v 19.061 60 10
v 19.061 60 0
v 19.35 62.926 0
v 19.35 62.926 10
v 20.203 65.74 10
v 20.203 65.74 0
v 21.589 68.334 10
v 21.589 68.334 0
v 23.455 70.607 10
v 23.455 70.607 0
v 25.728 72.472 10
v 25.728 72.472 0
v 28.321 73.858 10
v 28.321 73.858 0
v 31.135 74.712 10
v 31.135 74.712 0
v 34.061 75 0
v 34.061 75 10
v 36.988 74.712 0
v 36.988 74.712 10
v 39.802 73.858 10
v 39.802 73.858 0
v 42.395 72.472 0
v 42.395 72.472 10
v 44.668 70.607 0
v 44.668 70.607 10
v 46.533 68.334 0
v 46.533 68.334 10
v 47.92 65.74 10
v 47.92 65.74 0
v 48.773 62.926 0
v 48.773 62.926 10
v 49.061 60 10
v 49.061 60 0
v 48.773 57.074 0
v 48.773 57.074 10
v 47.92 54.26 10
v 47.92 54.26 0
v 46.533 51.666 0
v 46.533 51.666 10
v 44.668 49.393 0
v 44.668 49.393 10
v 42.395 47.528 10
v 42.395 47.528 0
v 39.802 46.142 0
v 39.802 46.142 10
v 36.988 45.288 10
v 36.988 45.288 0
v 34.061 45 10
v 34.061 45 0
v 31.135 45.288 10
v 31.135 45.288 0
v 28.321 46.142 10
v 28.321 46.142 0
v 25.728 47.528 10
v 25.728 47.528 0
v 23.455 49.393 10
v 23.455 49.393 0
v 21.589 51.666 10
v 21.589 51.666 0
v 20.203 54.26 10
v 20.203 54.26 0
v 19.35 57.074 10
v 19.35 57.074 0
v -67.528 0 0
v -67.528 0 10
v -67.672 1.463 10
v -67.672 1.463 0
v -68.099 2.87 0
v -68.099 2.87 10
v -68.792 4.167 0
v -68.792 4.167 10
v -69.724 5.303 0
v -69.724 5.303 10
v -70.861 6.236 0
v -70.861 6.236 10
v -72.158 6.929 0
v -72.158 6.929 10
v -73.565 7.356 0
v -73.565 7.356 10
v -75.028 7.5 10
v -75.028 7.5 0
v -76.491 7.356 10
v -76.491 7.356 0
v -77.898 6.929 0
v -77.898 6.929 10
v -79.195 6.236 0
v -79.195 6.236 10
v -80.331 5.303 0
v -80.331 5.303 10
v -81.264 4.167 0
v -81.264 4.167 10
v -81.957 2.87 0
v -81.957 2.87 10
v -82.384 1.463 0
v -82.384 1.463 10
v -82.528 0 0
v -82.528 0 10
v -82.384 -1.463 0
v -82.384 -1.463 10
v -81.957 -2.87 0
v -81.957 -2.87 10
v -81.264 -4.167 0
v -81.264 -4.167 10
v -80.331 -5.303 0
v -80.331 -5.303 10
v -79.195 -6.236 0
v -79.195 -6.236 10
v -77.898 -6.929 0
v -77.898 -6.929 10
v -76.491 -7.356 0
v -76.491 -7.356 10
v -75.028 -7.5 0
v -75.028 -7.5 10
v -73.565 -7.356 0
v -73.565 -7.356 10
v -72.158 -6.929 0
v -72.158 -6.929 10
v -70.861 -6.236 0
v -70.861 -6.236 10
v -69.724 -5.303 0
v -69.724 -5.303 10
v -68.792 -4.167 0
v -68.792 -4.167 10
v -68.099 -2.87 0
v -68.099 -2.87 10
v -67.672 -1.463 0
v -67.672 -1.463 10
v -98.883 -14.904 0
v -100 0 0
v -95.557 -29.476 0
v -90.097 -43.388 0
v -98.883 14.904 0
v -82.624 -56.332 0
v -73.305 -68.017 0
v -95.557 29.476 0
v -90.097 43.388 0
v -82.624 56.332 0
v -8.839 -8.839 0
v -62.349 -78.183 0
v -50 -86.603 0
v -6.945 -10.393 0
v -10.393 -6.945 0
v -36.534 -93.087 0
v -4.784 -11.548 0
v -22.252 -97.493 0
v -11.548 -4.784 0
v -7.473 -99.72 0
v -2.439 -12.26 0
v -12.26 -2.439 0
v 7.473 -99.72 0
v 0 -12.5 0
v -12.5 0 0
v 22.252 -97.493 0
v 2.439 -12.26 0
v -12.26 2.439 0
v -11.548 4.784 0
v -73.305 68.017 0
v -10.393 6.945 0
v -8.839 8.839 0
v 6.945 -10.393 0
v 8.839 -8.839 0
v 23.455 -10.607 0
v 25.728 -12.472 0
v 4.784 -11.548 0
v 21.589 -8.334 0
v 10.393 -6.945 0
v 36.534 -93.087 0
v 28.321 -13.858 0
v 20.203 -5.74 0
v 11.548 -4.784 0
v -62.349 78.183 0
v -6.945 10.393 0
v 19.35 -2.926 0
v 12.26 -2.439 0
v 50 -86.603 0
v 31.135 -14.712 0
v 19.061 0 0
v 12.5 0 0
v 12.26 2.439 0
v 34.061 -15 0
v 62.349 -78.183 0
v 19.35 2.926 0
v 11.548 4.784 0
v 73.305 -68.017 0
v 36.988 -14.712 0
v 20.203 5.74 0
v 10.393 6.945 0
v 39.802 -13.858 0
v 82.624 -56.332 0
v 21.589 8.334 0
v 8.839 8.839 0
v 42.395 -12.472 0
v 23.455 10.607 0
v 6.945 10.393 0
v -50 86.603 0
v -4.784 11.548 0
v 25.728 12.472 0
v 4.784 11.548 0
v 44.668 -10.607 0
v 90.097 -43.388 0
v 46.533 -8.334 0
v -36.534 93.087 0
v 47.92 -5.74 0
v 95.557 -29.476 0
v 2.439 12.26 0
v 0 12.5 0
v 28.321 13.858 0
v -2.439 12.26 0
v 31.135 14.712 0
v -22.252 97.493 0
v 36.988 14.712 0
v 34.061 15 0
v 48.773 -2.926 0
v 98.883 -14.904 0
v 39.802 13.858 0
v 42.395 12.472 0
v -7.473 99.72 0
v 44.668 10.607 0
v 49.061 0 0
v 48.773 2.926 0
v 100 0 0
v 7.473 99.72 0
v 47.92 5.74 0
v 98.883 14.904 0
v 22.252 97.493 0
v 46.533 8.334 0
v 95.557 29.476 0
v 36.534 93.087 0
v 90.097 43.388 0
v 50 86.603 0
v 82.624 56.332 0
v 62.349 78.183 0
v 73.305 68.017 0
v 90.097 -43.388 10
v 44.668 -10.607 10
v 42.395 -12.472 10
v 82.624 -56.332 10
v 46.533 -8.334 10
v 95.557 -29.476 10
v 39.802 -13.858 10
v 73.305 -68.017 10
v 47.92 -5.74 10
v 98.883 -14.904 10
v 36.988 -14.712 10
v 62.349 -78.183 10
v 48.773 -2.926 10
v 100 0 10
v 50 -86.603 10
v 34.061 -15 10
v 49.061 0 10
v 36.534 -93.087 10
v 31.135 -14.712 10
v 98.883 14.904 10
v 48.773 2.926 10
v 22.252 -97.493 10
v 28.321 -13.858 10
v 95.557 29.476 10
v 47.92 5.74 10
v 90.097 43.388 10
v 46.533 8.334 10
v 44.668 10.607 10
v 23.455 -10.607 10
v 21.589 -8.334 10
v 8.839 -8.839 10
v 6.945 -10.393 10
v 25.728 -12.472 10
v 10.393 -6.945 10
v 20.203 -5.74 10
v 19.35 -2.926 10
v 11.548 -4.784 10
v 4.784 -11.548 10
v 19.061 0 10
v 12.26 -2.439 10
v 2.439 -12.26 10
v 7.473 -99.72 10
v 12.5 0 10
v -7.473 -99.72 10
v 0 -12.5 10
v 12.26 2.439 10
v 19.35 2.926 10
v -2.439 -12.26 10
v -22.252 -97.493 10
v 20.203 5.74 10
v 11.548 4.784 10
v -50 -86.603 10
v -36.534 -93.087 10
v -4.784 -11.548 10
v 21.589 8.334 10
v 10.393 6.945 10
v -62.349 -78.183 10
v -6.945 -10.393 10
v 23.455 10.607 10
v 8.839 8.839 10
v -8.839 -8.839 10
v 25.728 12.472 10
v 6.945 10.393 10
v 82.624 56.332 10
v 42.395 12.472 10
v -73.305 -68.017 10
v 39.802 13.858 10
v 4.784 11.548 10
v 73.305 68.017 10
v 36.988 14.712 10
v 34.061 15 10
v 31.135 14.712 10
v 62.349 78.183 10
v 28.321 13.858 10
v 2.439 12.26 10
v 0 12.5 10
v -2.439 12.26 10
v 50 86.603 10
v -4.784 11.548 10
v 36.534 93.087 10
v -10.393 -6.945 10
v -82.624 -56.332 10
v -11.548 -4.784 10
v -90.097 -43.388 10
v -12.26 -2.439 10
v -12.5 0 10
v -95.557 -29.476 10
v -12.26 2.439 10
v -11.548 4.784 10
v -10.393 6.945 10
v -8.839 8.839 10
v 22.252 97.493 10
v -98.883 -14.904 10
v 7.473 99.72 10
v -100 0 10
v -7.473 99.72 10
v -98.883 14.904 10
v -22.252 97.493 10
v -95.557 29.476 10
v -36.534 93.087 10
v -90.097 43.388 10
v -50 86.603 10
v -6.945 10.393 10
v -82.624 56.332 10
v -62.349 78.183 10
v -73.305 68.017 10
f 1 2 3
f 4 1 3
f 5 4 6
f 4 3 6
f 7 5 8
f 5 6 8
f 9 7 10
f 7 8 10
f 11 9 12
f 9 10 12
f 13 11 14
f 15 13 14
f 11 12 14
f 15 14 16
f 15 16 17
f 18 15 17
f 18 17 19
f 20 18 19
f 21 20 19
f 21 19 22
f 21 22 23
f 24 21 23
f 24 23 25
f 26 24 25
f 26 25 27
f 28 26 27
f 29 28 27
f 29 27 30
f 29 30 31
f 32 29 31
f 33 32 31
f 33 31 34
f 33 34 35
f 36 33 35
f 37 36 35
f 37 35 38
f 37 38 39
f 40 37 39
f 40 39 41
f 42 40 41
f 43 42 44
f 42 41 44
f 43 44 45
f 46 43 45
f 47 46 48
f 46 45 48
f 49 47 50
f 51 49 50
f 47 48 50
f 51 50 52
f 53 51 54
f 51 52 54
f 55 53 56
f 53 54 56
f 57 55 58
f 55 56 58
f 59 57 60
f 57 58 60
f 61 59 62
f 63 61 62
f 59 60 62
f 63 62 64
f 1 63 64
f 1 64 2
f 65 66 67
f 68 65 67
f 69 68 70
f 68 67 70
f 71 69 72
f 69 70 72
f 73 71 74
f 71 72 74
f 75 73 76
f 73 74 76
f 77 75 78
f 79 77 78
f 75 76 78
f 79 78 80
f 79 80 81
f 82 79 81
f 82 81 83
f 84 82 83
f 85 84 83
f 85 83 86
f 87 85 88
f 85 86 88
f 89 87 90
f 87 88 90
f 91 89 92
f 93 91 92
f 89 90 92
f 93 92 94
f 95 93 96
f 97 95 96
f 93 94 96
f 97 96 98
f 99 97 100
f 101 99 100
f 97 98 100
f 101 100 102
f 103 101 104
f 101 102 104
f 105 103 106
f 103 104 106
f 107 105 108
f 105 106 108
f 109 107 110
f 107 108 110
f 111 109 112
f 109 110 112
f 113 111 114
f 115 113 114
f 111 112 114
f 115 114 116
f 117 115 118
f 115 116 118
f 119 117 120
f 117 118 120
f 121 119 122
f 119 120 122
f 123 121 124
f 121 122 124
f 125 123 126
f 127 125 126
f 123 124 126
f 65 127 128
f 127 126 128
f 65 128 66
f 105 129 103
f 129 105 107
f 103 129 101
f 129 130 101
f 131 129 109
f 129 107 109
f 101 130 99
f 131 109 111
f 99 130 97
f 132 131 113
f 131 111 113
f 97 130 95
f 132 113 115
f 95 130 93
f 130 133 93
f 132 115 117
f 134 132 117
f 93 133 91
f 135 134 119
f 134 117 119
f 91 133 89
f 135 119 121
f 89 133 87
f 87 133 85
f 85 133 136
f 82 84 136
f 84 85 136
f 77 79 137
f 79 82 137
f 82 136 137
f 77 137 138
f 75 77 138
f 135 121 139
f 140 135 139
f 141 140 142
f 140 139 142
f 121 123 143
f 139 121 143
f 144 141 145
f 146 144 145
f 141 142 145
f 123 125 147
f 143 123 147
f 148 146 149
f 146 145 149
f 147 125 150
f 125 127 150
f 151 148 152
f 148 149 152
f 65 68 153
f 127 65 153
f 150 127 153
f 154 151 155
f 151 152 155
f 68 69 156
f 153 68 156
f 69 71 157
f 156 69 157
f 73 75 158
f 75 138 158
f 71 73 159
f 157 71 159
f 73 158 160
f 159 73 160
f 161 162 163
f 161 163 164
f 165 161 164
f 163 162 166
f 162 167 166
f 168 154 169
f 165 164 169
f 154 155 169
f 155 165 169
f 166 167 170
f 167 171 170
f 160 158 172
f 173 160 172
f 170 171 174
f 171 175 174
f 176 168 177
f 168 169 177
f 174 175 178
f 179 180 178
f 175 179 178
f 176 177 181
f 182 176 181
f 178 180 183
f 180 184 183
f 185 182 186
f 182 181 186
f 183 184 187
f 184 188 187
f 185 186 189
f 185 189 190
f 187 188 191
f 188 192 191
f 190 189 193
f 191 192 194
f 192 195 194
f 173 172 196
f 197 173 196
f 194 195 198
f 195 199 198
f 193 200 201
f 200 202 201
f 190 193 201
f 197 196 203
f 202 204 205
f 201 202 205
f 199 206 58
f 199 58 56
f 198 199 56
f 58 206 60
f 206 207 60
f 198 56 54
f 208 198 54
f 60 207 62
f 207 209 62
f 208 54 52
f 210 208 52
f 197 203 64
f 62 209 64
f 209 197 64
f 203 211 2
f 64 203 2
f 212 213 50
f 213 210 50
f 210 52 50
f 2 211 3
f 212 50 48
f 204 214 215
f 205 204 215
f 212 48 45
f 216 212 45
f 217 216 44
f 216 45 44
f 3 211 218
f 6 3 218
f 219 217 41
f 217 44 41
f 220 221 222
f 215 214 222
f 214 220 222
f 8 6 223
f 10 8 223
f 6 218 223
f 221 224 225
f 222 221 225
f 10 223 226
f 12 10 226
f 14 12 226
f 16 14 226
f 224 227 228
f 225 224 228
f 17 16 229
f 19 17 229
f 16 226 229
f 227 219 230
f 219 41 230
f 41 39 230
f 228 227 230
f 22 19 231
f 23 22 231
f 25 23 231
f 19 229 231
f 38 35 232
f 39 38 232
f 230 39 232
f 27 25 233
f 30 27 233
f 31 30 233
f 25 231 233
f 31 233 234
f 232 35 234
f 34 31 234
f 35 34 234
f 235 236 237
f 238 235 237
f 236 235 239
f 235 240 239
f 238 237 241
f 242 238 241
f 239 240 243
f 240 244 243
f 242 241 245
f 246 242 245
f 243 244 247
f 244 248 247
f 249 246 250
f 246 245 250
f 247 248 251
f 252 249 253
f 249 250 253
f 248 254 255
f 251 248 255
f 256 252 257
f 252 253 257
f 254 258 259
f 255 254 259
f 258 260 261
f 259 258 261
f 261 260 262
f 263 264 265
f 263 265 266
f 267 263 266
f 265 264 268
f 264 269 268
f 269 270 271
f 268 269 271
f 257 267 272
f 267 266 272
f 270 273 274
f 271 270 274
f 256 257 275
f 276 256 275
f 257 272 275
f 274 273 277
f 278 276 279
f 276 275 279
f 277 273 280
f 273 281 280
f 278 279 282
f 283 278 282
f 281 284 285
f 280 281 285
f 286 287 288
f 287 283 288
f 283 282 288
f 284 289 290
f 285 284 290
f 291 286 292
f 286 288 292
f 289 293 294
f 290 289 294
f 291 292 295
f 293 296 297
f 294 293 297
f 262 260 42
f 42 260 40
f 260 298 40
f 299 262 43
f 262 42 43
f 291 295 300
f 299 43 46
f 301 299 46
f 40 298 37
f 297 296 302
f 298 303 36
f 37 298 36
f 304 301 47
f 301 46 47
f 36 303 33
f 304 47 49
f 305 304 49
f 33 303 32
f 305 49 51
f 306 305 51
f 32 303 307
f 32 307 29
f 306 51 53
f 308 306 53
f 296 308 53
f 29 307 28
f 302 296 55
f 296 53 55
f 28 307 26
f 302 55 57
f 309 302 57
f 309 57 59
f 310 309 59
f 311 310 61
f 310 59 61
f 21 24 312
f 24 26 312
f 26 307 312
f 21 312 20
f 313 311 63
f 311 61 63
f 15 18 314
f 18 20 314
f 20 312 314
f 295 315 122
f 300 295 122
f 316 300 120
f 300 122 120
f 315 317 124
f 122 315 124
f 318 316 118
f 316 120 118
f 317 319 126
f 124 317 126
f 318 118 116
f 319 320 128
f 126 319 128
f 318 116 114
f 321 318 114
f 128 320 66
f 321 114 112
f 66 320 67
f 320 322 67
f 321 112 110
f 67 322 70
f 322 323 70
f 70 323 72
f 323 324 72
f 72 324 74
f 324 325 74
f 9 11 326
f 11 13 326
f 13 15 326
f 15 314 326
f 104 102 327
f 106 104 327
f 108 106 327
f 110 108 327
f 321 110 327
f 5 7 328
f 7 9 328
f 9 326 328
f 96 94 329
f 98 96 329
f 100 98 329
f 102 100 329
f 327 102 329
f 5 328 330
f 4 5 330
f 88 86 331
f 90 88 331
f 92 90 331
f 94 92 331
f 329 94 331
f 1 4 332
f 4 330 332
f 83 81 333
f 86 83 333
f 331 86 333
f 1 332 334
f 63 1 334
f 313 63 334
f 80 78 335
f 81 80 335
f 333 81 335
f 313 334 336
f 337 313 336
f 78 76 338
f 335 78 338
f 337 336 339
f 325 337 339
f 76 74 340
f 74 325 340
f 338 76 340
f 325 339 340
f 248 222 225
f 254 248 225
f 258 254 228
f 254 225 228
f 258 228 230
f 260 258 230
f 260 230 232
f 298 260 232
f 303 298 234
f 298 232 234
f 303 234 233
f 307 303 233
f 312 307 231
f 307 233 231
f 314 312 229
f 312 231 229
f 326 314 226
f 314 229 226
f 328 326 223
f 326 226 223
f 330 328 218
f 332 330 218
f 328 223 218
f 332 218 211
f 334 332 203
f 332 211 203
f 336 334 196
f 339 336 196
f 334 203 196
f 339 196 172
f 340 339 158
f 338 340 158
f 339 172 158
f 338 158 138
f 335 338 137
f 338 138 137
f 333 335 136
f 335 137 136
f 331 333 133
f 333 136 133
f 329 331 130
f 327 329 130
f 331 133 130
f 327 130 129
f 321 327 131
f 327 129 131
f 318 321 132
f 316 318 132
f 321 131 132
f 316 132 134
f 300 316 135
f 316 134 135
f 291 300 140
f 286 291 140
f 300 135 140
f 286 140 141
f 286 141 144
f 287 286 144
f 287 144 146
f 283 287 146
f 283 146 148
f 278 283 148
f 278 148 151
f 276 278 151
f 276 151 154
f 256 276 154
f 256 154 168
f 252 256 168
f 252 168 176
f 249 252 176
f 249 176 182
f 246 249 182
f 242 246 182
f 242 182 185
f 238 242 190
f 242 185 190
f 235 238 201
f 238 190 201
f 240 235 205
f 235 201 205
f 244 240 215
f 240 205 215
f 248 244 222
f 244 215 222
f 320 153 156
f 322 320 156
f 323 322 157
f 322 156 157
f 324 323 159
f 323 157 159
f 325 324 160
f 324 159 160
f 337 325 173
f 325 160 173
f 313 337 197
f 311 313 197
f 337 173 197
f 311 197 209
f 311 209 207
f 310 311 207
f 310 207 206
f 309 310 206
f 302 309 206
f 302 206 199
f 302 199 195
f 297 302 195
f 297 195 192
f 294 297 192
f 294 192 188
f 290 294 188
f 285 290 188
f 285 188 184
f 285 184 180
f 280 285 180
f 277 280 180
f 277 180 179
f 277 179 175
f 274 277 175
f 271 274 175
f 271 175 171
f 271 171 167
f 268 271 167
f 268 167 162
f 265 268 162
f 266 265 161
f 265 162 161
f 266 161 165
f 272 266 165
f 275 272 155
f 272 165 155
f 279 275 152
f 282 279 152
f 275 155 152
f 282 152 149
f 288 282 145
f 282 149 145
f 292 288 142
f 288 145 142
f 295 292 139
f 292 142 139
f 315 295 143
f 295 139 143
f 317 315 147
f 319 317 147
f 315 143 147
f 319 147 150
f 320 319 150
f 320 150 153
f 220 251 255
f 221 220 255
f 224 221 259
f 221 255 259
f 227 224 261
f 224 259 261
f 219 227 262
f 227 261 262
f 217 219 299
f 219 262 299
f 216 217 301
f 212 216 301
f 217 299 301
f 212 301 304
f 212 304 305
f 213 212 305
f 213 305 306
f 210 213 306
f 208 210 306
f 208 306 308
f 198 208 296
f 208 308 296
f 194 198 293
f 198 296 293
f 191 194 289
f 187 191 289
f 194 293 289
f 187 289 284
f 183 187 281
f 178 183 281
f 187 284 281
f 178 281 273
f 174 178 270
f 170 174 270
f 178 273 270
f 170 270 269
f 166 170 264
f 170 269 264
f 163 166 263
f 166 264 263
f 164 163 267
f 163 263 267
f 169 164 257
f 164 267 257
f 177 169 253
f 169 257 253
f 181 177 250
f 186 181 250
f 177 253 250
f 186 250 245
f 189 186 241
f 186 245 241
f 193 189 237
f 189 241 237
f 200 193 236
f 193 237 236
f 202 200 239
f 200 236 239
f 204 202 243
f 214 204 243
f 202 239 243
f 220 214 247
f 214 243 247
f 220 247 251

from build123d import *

# Parameters (mm, degrees)
SKETCH1_R           = 100
BOSS_EXTRUDE1_DEPTH = 10
SKETCH3_R           = 12.5
CUT_EXTRUDE2_DEPTH  = 20
SKETCH2_R           = 7.5
CUT_EXTRUDE3_DEPTH  = 10
SKETCH5_R           = 15
CUT_EXTRUDE5_DEPTH  = 10
BOSS_EXTRUDE2_START = -10
SKETCH6_R           = 15
BOSS_EXTRUDE2_DEPTH = 10
SKETCH7_R           = 15
CUT_EXTRUDE6_DEPTH  = 30


with BuildPart() as part:
    # Sketch1 → Boss-Extrude1 (new body)
    with BuildSketch(Plane.XY):
        Circle(SKETCH1_R)
    extrude(amount=BOSS_EXTRUDE1_DEPTH)

    # Sketch3 → Cut-Extrude2 (cut)
    with BuildSketch(Plane(origin=(0, 0, 0), x_dir=(-1, 0, 0), z_dir=(0, 0, -1))):
        Circle(SKETCH3_R)
    extrude(amount=-CUT_EXTRUDE2_DEPTH, mode=Mode.SUBTRACT)

    # Sketch2 → Cut-Extrude3 (cut)
    with BuildSketch(Plane.XY.offset(10)):
        with Locations((-75.027755171, 0)):
            Circle(SKETCH2_R)
    extrude(amount=-CUT_EXTRUDE3_DEPTH, mode=Mode.SUBTRACT)

    # Sketch5 → Cut-Extrude5 (cut)
    with BuildSketch(Plane.XY.offset(10)):
        with Locations((34.061352159, 0)):
            Circle(SKETCH5_R)
        with Locations((79.061352159, 0)):
            Circle(SKETCH5_R)
    extrude(amount=-CUT_EXTRUDE5_DEPTH, mode=Mode.SUBTRACT)

    # Sketch6 → Boss-Extrude2 (add)
    with BuildSketch(Plane(origin=(0, 0, 0), x_dir=(-1, 0, 0), z_dir=(0, 0, -1)).offset(BOSS_EXTRUDE2_START)):
        with Locations((-79.061352159, 0)):
            Circle(SKETCH6_R)
    extrude(amount=BOSS_EXTRUDE2_DEPTH)

    # Sketch7 → Cut-Extrude6 (cut)
    with BuildSketch(Plane(origin=(0, 0, 0), x_dir=(-1, 0, 0), z_dir=(0, 0, -1))):
        with Locations((-34.061352159, 60)):
            Circle(SKETCH7_R)
    extrude(amount=-CUT_EXTRUDE6_DEPTH, mode=Mode.SUBTRACT)


solid = part.part
